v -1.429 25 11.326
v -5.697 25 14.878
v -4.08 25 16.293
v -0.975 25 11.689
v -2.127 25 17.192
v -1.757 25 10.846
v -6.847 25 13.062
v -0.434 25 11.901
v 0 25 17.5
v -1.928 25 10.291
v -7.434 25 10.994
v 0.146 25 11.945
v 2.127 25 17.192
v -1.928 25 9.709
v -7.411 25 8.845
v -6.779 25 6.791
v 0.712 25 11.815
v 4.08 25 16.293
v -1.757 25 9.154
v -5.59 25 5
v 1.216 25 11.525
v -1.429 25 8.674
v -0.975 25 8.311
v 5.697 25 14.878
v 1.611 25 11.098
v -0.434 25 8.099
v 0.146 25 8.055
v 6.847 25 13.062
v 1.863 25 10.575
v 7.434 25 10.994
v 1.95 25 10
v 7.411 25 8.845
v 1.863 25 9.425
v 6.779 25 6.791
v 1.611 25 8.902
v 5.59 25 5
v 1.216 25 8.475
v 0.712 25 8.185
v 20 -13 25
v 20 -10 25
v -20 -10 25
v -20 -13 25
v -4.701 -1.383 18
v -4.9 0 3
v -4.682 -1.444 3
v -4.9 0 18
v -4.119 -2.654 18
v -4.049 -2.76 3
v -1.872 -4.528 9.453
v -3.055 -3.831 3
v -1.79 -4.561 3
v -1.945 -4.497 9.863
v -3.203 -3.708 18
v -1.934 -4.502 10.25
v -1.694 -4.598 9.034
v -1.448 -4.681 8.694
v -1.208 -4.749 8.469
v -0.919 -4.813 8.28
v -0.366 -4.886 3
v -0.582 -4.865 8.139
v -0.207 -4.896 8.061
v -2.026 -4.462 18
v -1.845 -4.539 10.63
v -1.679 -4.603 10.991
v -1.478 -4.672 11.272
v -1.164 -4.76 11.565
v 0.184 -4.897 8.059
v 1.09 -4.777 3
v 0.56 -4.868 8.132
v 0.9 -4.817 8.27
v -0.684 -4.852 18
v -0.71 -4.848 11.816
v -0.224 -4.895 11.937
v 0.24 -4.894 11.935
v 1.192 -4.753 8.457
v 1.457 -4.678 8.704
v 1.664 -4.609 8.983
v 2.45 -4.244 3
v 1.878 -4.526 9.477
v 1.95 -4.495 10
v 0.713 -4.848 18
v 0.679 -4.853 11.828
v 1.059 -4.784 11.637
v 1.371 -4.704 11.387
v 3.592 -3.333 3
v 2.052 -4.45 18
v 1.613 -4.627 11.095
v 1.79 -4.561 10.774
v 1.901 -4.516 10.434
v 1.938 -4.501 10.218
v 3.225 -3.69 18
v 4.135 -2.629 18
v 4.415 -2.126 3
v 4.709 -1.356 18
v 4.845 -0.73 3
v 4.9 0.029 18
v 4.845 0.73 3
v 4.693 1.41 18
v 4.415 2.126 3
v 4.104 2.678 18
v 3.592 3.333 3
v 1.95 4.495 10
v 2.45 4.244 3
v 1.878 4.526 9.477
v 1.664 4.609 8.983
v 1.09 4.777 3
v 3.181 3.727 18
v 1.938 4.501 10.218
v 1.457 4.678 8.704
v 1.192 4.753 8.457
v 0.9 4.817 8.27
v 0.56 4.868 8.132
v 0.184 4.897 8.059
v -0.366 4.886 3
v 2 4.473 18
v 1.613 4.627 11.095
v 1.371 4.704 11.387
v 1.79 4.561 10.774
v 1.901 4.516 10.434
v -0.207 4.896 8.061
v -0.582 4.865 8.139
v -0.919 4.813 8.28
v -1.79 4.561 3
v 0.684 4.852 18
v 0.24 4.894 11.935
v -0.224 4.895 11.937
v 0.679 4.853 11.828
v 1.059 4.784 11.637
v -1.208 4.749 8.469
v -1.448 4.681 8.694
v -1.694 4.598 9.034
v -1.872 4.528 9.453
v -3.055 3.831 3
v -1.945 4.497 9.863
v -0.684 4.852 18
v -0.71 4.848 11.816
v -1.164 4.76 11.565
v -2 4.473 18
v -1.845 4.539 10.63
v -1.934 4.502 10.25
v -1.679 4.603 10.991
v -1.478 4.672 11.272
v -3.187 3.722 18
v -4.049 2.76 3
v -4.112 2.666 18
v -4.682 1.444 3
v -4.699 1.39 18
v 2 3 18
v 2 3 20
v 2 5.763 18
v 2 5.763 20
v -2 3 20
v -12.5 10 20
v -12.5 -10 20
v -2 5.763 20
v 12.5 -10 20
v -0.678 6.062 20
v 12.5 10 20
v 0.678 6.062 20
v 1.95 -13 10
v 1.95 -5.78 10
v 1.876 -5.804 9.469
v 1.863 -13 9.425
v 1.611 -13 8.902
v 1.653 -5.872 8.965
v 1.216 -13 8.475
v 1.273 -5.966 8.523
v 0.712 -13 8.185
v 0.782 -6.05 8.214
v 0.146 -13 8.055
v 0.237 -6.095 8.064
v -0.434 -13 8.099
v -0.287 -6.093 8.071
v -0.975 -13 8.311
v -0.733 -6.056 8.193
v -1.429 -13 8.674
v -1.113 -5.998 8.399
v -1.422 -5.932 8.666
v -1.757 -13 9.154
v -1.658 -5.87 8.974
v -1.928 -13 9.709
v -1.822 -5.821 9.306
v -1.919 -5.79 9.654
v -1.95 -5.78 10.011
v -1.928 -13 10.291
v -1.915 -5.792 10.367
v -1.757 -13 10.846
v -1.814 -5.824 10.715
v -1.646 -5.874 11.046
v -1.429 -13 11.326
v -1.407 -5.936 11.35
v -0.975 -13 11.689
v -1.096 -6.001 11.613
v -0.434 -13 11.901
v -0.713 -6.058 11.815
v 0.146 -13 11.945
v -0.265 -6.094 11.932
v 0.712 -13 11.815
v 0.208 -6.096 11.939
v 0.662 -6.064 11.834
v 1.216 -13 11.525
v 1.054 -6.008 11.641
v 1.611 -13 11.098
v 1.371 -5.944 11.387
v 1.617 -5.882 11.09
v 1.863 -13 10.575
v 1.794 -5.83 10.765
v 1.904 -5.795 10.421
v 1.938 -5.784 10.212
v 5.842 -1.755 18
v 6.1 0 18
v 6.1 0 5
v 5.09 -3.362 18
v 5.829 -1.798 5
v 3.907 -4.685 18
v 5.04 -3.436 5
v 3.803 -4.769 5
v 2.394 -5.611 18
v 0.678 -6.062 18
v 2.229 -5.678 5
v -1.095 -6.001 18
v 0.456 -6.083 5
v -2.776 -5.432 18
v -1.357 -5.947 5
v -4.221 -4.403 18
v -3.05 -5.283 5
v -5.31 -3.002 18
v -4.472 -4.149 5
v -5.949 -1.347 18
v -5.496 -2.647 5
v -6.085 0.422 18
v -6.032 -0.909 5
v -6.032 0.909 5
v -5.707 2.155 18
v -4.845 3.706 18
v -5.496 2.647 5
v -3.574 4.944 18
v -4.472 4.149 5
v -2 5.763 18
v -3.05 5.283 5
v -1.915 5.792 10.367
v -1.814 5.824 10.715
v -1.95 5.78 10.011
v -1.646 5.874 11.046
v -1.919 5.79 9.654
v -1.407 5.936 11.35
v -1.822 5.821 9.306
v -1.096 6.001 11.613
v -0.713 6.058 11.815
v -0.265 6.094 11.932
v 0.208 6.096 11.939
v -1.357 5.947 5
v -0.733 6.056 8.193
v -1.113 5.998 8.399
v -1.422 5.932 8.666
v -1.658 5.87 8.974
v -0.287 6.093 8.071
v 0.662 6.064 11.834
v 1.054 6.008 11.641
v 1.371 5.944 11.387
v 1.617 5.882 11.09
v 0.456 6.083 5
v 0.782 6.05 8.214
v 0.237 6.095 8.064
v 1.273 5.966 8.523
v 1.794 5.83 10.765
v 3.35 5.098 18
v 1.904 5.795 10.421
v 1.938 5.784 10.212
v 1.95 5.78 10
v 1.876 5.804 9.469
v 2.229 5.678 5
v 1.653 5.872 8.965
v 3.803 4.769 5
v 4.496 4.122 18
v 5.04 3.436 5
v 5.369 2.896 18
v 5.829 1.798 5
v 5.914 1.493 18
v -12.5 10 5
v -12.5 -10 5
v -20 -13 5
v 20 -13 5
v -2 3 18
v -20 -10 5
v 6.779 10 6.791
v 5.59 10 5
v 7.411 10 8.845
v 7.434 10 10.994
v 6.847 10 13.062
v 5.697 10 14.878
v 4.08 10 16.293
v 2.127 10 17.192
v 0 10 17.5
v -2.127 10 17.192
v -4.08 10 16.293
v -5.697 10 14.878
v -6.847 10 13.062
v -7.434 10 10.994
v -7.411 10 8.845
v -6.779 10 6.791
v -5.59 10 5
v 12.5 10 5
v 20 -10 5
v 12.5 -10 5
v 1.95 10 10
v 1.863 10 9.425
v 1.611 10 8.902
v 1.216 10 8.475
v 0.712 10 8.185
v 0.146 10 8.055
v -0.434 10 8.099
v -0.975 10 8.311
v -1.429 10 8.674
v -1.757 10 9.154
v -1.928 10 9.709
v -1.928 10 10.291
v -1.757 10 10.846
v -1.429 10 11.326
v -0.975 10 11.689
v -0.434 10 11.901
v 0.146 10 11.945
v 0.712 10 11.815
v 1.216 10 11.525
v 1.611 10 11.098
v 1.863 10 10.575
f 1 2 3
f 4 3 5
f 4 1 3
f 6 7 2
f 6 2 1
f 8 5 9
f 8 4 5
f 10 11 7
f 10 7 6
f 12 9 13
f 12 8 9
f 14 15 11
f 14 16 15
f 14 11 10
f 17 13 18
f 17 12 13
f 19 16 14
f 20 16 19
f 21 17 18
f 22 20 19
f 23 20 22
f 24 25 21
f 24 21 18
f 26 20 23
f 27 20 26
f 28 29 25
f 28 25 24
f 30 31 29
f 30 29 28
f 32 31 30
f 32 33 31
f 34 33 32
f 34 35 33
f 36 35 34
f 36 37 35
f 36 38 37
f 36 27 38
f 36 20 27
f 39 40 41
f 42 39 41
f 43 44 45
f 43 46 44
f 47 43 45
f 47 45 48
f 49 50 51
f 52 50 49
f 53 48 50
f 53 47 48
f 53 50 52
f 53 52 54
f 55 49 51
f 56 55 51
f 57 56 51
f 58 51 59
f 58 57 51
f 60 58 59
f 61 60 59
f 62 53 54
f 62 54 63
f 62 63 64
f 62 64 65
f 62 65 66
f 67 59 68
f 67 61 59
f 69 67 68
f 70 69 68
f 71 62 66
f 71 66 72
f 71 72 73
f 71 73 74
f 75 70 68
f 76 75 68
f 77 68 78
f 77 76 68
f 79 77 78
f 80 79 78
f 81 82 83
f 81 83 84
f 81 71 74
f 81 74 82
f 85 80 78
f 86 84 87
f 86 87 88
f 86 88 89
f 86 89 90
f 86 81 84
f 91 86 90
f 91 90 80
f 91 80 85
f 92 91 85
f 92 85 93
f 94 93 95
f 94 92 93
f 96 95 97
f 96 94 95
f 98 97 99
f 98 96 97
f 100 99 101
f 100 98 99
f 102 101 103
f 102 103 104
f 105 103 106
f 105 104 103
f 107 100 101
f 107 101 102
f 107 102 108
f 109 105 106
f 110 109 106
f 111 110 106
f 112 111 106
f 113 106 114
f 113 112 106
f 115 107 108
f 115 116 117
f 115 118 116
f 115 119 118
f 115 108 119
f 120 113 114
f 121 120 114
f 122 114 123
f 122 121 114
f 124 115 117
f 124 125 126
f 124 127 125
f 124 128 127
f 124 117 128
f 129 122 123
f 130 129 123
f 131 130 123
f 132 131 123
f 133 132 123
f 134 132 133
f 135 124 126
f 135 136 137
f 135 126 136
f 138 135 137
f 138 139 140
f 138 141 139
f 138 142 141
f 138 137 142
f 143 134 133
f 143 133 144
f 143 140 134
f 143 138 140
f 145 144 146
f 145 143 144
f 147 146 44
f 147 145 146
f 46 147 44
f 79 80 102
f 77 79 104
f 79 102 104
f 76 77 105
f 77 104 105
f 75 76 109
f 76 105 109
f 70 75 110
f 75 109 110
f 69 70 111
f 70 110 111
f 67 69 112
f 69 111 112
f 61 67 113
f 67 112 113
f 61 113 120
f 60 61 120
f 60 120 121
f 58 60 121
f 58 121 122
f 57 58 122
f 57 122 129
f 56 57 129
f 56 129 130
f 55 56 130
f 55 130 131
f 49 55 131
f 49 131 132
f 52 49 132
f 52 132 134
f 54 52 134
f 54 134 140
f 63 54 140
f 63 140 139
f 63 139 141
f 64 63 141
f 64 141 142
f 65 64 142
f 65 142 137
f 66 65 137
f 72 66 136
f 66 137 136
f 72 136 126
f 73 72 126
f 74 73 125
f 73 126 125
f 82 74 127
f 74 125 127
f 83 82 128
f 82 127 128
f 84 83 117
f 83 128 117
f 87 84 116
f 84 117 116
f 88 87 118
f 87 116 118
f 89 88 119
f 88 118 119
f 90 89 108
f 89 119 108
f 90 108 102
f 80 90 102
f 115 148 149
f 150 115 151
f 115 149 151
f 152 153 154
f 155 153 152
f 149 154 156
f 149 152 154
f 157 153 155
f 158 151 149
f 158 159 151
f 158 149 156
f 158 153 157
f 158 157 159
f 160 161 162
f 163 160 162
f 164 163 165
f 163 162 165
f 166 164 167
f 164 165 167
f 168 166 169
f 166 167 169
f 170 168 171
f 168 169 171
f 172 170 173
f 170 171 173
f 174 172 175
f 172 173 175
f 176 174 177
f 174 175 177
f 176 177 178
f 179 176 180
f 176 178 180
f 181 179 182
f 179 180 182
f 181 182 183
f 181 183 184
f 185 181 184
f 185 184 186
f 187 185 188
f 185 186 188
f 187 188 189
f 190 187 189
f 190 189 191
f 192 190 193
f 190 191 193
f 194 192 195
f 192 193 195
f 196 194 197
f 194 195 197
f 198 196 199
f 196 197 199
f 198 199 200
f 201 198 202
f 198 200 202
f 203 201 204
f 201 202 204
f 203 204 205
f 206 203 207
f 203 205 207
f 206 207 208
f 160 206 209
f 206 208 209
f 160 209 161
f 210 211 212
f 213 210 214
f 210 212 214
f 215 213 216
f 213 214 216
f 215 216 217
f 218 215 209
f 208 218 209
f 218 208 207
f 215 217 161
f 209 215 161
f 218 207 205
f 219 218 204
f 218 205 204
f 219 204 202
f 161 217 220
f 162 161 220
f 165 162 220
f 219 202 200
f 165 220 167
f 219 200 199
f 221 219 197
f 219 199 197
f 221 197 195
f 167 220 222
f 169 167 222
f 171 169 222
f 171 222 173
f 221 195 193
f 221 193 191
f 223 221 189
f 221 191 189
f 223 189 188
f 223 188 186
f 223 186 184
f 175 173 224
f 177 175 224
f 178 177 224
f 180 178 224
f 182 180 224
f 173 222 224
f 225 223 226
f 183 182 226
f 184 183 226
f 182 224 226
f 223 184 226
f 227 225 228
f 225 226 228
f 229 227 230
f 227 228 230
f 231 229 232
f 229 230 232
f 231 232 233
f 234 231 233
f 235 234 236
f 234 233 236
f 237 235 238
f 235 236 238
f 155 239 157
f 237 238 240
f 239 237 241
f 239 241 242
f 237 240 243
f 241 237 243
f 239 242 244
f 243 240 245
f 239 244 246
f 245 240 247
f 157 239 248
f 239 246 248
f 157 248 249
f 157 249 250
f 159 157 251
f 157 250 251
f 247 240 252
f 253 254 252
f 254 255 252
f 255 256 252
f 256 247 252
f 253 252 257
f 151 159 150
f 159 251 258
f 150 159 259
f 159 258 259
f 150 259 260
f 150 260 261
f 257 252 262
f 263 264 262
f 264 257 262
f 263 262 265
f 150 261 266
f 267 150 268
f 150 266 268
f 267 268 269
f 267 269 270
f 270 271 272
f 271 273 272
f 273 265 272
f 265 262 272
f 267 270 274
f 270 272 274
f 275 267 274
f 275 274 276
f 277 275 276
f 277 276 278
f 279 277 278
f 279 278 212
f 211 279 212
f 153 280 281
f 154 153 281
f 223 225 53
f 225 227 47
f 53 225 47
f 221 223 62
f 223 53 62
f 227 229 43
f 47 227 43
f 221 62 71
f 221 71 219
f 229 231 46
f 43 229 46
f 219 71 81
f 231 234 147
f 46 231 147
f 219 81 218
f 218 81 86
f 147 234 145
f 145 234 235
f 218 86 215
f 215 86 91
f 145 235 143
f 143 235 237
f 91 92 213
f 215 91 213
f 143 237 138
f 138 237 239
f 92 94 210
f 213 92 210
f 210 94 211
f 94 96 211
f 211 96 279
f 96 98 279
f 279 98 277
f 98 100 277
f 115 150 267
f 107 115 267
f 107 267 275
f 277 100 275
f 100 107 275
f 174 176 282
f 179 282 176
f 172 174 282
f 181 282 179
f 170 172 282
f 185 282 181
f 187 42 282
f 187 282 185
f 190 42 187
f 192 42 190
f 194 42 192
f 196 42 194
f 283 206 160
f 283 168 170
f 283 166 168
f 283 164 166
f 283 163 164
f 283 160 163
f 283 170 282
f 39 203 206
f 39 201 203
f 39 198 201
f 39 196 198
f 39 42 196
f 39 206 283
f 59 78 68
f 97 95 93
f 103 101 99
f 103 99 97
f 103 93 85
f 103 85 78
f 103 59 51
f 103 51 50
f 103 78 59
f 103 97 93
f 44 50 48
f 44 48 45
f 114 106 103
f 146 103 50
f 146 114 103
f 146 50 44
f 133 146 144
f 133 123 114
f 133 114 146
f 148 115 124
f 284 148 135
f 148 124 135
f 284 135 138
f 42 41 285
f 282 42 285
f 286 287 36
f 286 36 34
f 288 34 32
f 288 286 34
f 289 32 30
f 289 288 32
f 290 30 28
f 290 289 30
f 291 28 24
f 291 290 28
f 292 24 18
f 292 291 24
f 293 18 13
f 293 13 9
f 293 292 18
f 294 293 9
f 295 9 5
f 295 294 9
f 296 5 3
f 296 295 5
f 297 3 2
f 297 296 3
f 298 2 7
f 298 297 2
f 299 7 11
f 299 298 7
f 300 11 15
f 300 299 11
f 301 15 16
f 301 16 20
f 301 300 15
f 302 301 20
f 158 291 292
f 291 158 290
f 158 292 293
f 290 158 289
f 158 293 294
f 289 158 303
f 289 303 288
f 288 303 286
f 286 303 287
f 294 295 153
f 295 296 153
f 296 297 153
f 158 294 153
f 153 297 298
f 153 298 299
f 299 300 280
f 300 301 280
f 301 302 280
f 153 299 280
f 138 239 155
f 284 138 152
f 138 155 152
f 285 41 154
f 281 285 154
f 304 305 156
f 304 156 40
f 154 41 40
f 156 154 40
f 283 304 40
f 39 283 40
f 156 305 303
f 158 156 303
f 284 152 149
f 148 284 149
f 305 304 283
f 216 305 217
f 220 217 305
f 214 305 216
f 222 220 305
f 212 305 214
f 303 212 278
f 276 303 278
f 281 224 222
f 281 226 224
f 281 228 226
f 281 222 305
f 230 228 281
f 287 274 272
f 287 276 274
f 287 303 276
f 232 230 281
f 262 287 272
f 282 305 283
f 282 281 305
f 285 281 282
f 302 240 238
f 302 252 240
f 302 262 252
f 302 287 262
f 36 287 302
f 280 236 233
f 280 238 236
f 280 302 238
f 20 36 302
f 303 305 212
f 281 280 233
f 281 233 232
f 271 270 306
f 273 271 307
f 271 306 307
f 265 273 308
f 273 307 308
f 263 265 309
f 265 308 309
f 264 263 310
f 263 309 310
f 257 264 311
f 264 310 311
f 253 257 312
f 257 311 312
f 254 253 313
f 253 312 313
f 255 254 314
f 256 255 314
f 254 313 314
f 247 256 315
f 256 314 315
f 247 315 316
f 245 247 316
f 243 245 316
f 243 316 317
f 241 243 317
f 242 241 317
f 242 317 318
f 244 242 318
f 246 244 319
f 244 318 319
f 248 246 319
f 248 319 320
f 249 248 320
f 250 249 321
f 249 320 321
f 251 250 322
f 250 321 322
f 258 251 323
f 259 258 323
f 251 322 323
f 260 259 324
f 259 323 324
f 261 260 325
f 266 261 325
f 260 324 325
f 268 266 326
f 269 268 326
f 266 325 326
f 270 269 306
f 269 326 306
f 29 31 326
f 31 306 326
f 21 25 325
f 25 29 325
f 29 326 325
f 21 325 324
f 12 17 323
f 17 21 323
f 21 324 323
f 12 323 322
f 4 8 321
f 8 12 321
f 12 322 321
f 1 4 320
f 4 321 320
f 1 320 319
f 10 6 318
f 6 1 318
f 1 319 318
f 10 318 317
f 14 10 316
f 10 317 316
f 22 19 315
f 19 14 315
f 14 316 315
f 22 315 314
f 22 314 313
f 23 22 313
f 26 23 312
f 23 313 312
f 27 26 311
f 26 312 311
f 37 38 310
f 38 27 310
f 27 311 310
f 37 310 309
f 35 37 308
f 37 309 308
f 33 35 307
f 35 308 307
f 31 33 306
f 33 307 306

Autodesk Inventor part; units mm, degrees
ref_plane "YZ Plane" through (0, 0, 0) normal (1, 0, 0) x (0, 1, 0)
ref_plane "XZ Plane" through (0, 0, 0) normal (0, 1, 0) x (-1, 0, 0)
ref_plane "XY Plane" through (0, 0, 0) normal (0, 0, 1) x (1, 0, 0)
sketch "Sketch1" plane through (0, 0, 0) normal (0, 0, 1) x (1, 0, 0)
  circle A0 centre (0, 0) radius 6.1
  line L0 (-12.5, -10) -> (12.5, -10)
  line L1 (12.5, -10) -> (12.5, 10)
  line L2 (12.5, 10) -> (-12.5, 10)
  line L3 (-12.5, 10) -> (-12.5, -10)
  line L4 (-12.5, -10) -> (12.5, 10) construction
  line L5 (12.5, -10) -> (-12.5, 10) construction
  dimension "d0" = 12.2
  dimension "d1" = 25
  dimension "d2" = 20
extrude "Extrusion1" add sketch "Sketch1" along normal blind 20
sketch "Sketch2" plane through (-12.5, 10, 0) normal (0, 1, 0) x (1, 0, 0)
  line L0 (0, 0) -> (0, -20) construction
  line L1 (25, -20) -> (0, -20) construction
  line L2 (0, 0) -> (25, -20) construction
  line L3 (0, -20) -> (25, 0) construction
  circle A0 centre (12.5, -10) radius 1.95
  point P0 (12.5, 0)
  dimension "d5" = 3.9
extrude "Extrusion2" cut sketch "Sketch2" against normal blind 100
sketch "Sketch3" plane through (-12.5, 10, 0) normal (0, 1, 0) x (1, 0, 0)
  circle A0 centre (12.5, -10) radius 1.95 projected
  line L0 (25, 0) -> (0, 0) projected
  line L1 (0, 0) -> (0, -20) projected
  line L2 (25, -20) -> (0, -20) projected
  line L3 (25, 0) -> (25, -20) projected
  circle A1 centre (12.5, -10) radius 7.5
  point P0 (12.5, 0)
  dimension "d8" = 15
extrude "Extrusion3" add sketch "Sketch3" along normal blind 15 contours A1
sketch "Sketch4" plane through (-12.5, -10, 0) normal (0, -1, 0) x (1, 0, 0)
  line L0 (32.5, 25) -> (-7.5, 25)
  line L1 (-7.5, 25) -> (-7.5, -5)
  line L2 (-7.5, -5) -> (32.5, -5)
  line L3 (32.5, -5) -> (32.5, 25)
  circle A0 centre (12.5, 10) radius 1.95 projected
  line L4 (32.5, 25) -> (-7.5, -5) construction
  line L5 (-7.5, 25) -> (32.5, -5) construction
  point P0 (12.5, 0)
  dimension "d11" = 30
  dimension "d12" = 40
extrude "Extrusion4" add sketch "Sketch4" along normal blind 3
sketch "Sketch6" plane through (20, -10, -5) normal (0, 0, -1) x (-1, 0, 0)
  line L0 (-13.3468, 43.0165) -> (63.7046, 43.0165)
  line L1 (63.7046, 43.0165) -> (63.7046, -16.6019)
  line L2 (63.7046, -16.6019) -> (-13.3468, -16.6019)
  line L3 (-13.3468, -16.6019) -> (-13.3468, 43.0165)
  point P0 (20, 10)
extrude "Extrusion6" cut sketch "Sketch6" against normal blind 10
sketch "Sketch8" plane through (-12.5, 25, 0) normal (0, 1, 0) x (1, 0, 0)
  circle A0 centre (12.5, -10) radius 1.95 projected
  point P0 (12.5, 0)
extrude "Extrusion8" cut sketch "Sketch8" against normal blind 100
sketch "Sketch9" plane through (0, 0, 20) normal (0, 0, 1) x (1, 0, 0)
  line L0 (-2, 5.7628) -> (-2, 3)
  line L1 (-2, 3) -> (2, 3)
  line L2 (2, 3) -> (2, 5.7628)
  circle A0 centre (0, 0) radius 6.1 projected
  line L3 (12.5, -10) -> (12.5, 10) projected
  line L4 (12.5, 10) -> (-12.5, 10) projected
  line L5 (-12.5, 10) -> (-12.5, -10) projected
  line L6 (-12.5, -10) -> (12.5, -10) projected
  circle A1 centre (0, 0) radius 6.1 projected
  dimension "d28" = 2
  dimension "d29" = 2
  dimension "d30" = 3
extrude "Extrusion9" add sketch "Sketch9" against normal blind 2 contours L0 L1 L2 A0 picked at (0.2259, -0.0207)
sketch "Sketch10" plane through (0, 0, 18) normal (0, 0, -1) x (-1, 0, 0)
  circle A0 centre (0, 0) radius 4.9
  dimension "d33" = 9.8
extrude "Extrusion10" add sketch "Sketch10" along normal blind 15
sketch "Sketch11" plane through (-12.5, 25, 0) normal (0, 1, 0) x (1, 0, 0)
  circle A0 centre (12.5, -10) radius 1.95 projected
  point P0 (12.5, 0)
extrude "Extrusion11" cut sketch "Sketch11" against normal blind 100
properties part number "Primary_hinge_template"
